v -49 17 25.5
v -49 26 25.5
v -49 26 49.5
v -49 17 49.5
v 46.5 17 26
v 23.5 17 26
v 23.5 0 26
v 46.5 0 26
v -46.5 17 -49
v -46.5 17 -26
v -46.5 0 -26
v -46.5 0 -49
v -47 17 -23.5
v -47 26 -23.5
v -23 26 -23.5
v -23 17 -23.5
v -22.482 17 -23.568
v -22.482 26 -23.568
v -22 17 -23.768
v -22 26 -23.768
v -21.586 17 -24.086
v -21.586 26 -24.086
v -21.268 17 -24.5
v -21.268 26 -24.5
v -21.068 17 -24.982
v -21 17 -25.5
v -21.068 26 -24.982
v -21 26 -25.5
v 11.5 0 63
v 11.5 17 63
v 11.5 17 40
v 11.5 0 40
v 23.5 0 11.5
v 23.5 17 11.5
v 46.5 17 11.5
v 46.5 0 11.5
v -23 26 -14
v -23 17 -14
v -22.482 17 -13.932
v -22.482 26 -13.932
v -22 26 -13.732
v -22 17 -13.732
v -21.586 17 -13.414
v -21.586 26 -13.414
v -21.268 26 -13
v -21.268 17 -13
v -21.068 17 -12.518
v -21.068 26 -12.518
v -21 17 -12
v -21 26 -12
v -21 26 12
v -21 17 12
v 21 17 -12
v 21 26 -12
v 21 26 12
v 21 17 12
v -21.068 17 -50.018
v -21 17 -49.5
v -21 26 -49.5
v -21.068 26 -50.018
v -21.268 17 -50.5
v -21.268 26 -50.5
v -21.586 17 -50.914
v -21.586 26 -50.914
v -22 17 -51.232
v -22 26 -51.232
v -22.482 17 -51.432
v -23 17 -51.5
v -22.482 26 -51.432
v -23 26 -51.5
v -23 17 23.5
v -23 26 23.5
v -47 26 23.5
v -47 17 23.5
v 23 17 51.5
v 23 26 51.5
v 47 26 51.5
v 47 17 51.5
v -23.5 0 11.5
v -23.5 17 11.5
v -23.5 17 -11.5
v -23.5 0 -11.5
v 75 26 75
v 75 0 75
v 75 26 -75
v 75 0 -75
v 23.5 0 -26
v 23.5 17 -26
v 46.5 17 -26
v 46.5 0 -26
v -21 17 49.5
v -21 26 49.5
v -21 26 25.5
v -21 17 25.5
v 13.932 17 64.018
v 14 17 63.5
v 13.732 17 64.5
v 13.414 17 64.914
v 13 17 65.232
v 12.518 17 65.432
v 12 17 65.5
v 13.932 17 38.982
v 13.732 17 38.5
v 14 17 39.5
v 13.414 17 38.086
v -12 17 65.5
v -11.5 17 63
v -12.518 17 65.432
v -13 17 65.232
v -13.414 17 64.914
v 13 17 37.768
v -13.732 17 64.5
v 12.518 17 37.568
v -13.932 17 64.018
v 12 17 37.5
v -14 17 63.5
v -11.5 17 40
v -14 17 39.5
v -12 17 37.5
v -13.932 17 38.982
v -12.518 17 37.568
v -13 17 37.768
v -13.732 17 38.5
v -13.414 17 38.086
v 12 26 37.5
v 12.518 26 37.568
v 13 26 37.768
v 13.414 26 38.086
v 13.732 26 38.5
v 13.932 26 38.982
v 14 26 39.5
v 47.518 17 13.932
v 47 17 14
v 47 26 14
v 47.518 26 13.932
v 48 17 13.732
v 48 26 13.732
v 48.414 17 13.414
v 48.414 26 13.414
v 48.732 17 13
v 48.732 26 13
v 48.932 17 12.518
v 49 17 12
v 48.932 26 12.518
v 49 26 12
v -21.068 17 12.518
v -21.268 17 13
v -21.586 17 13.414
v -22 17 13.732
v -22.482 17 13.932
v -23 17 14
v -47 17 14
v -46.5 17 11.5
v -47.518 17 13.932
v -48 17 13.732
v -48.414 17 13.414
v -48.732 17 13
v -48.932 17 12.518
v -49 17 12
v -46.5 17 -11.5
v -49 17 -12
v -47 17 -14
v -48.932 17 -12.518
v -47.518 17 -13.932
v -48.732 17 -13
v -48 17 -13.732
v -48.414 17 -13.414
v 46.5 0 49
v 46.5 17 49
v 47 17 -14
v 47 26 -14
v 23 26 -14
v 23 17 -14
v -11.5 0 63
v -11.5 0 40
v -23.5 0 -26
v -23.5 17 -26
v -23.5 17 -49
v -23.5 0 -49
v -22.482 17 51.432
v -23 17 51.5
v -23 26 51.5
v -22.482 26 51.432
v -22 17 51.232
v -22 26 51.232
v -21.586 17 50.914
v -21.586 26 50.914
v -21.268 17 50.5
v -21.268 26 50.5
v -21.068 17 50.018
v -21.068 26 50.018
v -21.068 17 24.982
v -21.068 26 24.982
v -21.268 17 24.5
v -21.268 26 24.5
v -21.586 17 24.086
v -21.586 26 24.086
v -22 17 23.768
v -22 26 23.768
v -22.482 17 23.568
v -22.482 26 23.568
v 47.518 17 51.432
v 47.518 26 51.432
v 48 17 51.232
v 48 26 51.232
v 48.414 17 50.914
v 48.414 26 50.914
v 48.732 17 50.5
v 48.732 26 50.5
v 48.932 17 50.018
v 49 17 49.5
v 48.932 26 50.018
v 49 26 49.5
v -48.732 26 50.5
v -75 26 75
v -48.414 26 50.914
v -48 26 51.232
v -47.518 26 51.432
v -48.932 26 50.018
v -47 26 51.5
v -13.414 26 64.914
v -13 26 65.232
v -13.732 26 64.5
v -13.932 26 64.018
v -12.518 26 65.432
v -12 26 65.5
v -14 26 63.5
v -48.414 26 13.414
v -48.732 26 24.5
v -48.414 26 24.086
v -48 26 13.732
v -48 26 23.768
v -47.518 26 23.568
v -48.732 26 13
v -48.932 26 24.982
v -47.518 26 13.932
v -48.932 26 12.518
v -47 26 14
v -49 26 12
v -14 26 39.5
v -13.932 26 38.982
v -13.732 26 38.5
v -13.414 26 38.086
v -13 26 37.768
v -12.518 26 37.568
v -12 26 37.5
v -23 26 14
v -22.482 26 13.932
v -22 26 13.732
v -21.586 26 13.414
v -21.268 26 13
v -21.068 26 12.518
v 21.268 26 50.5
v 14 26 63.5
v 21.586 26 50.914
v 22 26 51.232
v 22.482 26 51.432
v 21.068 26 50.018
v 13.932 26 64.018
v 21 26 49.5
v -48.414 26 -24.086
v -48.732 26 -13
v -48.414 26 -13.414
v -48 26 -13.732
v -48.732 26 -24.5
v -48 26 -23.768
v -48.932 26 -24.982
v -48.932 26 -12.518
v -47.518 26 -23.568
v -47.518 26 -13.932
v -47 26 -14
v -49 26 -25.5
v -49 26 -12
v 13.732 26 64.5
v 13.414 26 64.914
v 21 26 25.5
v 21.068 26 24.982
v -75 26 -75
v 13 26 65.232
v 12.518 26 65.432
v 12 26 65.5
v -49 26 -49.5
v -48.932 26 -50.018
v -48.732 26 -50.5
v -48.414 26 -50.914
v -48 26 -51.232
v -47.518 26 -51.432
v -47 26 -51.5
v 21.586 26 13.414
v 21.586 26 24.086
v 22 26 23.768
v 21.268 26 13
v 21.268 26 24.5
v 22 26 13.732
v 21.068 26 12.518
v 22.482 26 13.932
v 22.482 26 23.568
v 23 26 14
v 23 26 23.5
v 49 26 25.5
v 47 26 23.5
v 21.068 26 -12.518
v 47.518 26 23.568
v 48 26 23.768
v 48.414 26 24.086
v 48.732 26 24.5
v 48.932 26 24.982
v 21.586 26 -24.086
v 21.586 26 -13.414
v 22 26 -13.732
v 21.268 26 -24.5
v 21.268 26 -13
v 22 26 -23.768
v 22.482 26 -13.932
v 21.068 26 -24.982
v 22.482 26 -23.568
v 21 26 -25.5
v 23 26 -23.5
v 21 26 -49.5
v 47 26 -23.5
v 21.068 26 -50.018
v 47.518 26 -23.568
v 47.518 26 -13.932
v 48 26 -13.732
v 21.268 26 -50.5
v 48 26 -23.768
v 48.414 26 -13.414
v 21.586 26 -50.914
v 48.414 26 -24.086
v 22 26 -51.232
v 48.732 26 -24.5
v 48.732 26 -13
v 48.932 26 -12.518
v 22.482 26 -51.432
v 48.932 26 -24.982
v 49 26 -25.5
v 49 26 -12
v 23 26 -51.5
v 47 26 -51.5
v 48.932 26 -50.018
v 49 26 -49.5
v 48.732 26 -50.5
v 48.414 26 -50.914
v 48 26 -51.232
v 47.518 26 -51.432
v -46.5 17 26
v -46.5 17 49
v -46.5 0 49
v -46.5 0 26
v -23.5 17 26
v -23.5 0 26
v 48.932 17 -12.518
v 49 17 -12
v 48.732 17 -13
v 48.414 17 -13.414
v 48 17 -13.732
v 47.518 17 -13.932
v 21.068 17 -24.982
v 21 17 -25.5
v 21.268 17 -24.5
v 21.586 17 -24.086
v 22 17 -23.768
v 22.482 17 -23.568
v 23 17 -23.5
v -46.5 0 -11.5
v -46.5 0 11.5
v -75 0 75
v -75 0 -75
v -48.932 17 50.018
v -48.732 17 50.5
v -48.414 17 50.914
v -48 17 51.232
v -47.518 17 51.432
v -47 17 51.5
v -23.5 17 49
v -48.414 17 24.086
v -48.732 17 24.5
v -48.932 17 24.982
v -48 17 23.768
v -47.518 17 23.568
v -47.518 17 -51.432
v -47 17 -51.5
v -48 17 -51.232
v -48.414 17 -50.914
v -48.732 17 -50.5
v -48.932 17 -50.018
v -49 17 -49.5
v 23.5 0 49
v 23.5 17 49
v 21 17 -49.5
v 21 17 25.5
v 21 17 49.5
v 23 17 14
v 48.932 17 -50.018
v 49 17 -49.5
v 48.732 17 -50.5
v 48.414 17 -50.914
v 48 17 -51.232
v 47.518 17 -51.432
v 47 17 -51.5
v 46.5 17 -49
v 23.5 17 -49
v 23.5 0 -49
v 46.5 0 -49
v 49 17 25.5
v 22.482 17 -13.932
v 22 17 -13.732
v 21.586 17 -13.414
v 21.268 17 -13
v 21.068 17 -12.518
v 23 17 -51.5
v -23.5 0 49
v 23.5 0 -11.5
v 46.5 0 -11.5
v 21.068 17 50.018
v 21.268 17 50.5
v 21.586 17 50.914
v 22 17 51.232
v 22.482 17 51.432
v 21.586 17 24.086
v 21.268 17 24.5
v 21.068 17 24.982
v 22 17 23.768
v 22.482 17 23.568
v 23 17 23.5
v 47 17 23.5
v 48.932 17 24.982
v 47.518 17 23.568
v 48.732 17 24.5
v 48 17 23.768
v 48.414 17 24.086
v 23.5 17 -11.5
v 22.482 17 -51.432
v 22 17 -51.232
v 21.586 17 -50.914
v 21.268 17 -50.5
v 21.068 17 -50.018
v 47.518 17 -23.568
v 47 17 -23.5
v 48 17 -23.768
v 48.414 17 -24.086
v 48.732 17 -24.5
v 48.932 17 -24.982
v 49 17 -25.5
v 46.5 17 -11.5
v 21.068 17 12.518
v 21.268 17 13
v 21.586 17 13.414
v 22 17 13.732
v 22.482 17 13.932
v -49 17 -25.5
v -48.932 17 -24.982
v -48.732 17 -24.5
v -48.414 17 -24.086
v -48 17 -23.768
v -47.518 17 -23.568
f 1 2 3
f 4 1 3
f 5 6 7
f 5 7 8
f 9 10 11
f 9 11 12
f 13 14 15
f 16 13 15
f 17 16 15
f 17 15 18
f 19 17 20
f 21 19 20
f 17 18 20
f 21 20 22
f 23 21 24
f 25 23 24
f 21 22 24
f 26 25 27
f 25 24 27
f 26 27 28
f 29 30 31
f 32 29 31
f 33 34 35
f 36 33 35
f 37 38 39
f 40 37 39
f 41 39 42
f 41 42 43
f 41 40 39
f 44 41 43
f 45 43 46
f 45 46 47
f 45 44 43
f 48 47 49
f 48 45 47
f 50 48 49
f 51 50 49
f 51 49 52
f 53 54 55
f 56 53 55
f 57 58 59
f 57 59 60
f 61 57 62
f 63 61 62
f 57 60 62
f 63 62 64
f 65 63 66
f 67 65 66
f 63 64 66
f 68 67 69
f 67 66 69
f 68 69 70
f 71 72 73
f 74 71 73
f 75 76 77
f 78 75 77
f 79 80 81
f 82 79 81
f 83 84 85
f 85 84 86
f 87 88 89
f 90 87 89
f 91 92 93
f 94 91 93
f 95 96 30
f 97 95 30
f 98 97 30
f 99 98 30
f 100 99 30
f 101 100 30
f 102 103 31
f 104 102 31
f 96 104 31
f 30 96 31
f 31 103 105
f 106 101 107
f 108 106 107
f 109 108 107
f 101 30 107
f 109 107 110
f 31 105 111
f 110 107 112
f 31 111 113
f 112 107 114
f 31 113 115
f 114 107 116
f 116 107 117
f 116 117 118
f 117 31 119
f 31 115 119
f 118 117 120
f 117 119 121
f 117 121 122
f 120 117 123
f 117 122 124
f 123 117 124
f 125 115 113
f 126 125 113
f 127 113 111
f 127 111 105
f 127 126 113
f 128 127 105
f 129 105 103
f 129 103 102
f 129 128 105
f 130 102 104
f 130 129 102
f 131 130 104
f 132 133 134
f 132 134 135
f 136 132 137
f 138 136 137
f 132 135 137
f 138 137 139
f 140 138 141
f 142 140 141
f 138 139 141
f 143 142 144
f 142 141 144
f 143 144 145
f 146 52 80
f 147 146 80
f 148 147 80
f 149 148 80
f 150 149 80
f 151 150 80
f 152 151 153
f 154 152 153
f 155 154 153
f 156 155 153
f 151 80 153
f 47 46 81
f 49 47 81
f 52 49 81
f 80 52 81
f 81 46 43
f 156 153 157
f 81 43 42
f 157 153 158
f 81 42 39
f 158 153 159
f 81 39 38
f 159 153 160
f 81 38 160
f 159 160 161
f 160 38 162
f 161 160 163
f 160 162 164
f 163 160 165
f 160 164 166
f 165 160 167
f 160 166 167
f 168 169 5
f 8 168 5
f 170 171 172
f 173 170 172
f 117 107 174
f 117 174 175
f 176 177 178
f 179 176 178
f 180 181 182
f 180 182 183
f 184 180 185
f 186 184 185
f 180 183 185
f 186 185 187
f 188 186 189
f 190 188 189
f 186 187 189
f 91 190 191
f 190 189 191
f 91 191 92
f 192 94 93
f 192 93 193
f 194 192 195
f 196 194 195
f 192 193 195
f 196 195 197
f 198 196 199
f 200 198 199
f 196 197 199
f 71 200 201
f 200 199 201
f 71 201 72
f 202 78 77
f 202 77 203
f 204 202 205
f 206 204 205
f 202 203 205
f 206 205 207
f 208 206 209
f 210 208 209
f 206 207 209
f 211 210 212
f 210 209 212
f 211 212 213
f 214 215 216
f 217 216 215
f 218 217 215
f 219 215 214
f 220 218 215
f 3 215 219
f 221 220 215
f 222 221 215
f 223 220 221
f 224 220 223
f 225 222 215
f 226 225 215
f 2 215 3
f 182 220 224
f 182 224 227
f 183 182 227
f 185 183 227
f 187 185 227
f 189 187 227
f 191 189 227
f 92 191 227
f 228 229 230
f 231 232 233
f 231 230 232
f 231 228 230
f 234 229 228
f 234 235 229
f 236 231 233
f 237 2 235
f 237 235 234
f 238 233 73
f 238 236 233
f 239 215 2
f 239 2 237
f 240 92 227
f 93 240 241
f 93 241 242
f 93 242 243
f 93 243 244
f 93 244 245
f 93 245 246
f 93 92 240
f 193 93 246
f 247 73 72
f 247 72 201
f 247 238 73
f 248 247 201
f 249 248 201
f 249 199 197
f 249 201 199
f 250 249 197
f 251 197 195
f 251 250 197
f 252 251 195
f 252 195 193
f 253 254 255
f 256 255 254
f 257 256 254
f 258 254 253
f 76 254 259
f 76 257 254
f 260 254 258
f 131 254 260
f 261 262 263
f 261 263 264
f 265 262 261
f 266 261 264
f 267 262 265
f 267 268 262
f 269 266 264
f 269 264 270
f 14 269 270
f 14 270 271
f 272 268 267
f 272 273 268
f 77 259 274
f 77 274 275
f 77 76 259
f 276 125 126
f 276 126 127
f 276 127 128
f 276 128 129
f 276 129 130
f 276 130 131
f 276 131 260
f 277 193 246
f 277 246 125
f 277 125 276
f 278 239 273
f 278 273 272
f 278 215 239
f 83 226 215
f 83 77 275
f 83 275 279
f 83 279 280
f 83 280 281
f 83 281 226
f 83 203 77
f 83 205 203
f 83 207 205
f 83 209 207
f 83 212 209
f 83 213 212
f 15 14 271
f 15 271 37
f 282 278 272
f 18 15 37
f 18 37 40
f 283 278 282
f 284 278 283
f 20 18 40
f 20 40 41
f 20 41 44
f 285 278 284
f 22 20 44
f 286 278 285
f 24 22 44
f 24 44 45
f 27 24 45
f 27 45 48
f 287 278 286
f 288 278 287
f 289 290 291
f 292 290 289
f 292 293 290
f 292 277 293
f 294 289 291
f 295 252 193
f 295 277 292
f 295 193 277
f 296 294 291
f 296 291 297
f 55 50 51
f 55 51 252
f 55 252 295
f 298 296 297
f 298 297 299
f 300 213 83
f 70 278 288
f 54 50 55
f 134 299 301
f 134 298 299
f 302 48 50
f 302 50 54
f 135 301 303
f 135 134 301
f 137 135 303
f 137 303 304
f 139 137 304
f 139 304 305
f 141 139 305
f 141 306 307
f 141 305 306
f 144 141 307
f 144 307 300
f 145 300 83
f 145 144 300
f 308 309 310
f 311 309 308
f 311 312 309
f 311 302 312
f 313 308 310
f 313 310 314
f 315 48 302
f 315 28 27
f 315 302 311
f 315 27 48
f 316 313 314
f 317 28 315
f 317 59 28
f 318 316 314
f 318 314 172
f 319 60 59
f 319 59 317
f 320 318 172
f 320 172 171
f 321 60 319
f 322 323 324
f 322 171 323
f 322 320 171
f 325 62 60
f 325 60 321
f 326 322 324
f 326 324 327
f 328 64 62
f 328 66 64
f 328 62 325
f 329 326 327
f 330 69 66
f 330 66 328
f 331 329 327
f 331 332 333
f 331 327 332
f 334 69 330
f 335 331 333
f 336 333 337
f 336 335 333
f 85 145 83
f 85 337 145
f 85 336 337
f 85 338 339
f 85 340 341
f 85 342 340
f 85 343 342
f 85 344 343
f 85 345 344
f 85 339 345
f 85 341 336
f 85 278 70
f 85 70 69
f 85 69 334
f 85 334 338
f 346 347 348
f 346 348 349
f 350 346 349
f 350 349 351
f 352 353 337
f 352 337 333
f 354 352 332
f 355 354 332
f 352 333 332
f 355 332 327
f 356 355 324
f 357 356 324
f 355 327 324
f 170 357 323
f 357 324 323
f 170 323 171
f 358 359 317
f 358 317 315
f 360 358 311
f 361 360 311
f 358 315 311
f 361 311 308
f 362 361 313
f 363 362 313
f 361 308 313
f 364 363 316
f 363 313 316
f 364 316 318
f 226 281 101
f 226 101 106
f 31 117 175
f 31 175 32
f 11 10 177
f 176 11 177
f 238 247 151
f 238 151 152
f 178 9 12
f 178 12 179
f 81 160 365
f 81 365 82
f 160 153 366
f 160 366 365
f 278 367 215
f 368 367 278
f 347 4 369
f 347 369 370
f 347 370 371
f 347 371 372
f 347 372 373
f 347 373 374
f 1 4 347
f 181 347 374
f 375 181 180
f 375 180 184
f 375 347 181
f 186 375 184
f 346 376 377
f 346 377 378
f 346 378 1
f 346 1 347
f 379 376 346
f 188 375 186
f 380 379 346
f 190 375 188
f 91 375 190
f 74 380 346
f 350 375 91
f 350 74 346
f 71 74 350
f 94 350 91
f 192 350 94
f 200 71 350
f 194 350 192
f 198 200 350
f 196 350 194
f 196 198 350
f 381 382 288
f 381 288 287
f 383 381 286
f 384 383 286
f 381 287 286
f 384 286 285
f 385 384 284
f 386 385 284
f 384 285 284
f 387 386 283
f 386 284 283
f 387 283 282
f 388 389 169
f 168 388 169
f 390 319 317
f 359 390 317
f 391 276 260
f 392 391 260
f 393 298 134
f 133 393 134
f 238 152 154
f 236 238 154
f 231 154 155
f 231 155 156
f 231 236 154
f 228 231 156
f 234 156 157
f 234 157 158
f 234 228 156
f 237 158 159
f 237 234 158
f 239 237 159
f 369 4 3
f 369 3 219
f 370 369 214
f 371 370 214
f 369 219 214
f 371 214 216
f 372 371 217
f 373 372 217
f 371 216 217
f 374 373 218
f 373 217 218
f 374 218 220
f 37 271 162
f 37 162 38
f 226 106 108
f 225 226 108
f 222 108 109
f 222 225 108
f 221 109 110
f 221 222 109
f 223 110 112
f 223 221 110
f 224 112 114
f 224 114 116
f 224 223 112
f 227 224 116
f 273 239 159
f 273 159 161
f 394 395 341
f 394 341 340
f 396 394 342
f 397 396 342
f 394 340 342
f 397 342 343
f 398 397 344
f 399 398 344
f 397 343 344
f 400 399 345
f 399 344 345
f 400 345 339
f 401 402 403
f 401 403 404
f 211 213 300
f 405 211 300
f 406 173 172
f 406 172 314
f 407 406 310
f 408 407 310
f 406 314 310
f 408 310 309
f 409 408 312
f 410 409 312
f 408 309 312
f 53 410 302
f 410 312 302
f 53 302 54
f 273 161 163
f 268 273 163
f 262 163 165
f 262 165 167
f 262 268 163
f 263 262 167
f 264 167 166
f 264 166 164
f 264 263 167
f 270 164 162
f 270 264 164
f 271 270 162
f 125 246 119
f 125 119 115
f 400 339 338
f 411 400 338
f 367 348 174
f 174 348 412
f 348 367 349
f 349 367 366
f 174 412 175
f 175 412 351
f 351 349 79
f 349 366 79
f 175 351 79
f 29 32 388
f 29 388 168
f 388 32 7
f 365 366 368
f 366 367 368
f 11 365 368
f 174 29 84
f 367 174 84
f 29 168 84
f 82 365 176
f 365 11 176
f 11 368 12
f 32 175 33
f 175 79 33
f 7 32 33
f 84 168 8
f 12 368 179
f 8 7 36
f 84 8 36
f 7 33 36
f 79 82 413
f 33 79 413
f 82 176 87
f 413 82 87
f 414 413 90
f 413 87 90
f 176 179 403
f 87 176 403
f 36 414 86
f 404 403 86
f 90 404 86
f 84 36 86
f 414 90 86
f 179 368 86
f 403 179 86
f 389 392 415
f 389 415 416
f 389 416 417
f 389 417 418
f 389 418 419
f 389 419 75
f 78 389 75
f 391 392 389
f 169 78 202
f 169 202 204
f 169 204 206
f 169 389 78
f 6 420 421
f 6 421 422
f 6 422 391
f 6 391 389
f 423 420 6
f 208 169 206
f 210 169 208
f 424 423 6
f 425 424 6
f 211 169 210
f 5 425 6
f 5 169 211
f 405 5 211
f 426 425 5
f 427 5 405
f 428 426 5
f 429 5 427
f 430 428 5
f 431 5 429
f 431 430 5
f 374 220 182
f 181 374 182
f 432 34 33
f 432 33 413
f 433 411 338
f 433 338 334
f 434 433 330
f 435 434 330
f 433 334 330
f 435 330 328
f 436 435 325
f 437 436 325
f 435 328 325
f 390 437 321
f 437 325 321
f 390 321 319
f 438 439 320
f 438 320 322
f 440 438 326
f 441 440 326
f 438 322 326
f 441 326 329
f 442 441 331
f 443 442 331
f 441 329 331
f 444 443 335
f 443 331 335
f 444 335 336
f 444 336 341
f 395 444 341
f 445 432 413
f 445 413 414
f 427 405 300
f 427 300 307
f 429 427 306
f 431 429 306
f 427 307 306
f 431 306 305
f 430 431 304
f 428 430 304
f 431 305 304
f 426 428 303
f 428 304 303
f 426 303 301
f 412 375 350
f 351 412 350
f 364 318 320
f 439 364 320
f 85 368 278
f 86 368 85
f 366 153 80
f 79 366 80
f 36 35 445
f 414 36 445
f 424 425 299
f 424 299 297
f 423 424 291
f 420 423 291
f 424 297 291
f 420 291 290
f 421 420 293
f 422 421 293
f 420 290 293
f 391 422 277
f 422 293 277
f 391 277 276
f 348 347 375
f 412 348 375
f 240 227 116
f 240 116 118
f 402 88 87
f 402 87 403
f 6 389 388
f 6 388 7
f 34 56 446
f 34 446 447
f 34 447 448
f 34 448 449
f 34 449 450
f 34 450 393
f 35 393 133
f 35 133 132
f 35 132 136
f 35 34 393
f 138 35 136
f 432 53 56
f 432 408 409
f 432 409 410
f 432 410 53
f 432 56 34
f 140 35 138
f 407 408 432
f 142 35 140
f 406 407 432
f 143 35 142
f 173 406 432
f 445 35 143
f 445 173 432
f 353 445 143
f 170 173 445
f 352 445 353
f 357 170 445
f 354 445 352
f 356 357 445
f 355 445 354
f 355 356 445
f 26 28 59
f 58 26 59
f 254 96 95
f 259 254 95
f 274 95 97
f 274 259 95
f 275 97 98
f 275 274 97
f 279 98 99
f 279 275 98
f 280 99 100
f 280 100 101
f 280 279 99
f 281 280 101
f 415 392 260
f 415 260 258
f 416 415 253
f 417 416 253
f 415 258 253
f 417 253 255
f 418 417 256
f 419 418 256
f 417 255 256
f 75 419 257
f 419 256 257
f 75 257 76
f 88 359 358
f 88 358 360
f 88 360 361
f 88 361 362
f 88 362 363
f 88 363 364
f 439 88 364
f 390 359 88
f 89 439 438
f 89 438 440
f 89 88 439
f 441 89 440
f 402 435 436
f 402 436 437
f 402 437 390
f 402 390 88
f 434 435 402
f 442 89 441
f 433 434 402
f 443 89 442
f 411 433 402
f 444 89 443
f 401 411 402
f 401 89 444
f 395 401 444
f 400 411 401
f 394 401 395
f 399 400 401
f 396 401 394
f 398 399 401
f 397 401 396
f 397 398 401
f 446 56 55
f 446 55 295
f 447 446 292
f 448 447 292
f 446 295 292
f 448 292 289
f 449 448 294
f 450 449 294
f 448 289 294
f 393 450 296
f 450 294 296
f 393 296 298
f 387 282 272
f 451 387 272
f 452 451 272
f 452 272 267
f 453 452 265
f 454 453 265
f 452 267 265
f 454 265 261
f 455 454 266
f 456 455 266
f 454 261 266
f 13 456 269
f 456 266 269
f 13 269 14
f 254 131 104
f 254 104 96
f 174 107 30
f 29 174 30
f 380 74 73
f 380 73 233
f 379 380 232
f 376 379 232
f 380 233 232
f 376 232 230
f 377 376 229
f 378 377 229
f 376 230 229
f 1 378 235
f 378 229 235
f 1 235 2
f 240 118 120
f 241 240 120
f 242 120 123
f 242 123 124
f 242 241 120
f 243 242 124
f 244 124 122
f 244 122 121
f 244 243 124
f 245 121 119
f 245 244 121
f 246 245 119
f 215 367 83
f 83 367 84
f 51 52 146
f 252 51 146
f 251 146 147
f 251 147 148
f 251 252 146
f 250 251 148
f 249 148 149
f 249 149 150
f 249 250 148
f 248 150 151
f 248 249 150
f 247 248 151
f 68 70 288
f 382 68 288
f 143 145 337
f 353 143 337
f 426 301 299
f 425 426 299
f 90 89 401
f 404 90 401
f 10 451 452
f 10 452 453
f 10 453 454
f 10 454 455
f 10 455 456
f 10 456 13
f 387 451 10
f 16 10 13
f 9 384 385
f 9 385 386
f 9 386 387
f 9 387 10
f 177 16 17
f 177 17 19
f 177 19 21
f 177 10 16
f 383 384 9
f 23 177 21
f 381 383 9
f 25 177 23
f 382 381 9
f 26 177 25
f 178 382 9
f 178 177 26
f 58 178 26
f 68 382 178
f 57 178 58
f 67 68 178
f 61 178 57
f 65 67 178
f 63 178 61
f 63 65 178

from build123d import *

# Parameters (mm, degrees)
SKETCH1_W           = 150
SKETCH1_H           = 150
BOSS_EXTRUDE1_DEPTH = 26
CUT_EXTRUDE1_DEPTH  = 9
SKETCH3_W           = 23
SKETCH3_H           = 23
CUT_EXTRUDE2_DEPTH  = 18


with BuildPart() as part:
    # Sketch1 → Boss-Extrude1 (new body)
    with BuildSketch(Plane(origin=(0, 0, 0), x_dir=(1, 0, 0), z_dir=(0, 1, 0))):
        Rectangle(SKETCH1_W, SKETCH1_H)
    extrude(amount=BOSS_EXTRUDE1_DEPTH)

    # Sketch2 → Cut-Extrude1 (cut)
    with BuildSketch(Plane(origin=(0, 26, 0), x_dir=(1, 0, 0), z_dir=(0, 1, 0))):
        with BuildLine():
            Line((-47, 23.5), (-23, 23.5))
            ThreePointArc((-23, 23.5), (-21.585786438, 24.085786438), (-21, 25.5))
            Line((-21, 25.5), (-21, 49.5))
            ThreePointArc((-21, 49.5), (-21.585786438, 50.914213562), (-23, 51.5))
            Line((-23, 51.5), (-47, 51.5))
            ThreePointArc((-47, 51.5), (-48.414213562, 50.914213562), (-49, 49.5))
            Line((-49, 49.5), (-49, 25.5))
            ThreePointArc((-49, 25.5), (-48.414213562, 24.085786438), (-47, 23.5))
        make_face()
        with BuildLine():
            Line((-47, 14), (-23, 14))
            ThreePointArc((-23, 14), (-21.585786438, 13.414213562), (-21, 12))
            Line((-21, 12), (-21, -12))
            ThreePointArc((-21, -12), (-21.585786438, -13.414213562), (-23, -14))
            Line((-23, -14), (-47, -14))
            ThreePointArc((-47, -14), (-48.414213562, -13.414213562), (-49, -12))
            Line((-49, -12), (-49, 12))
            ThreePointArc((-49, 12), (-48.414213562, 13.414213562), (-47, 14))
        make_face()
        with BuildLine():
            Line((-21, -49.5), (-21, -25.5))
            ThreePointArc((-21, -25.5), (-21.585786438, -24.085786438), (-23, -23.5))
            Line((-23, -23.5), (-47, -23.5))
            ThreePointArc((-47, -23.5), (-48.414213562, -24.085786438), (-49, -25.5))
            Line((-49, -25.5), (-49, -49.5))
            ThreePointArc((-49, -49.5), (-48.414213562, -50.914213562), (-47, -51.5))
            Line((-47, -51.5), (-23, -51.5))
            ThreePointArc((-23, -51.5), (-21.585786438, -50.914213562), (-21, -49.5))
        make_face()
        with BuildLine():
            Line((47, -23.5), (23, -23.5))
            ThreePointArc((23, -23.5), (21.585786438, -24.085786438), (21, -25.5))
            Line((21, -25.5), (21, -49.5))
            ThreePointArc((21, -49.5), (21.585786438, -50.914213562), (23, -51.5))
            Line((23, -51.5), (47, -51.5))
            ThreePointArc((47, -51.5), (48.414213562, -50.914213562), (49, -49.5))
            Line((49, -49.5), (49, -25.5))
            ThreePointArc((49, -25.5), (48.414213562, -24.085786438), (47, -23.5))
        make_face()
        with BuildLine():
            Line((21, 49.5), (21, 25.5))
            ThreePointArc((21, 25.5), (21.585786438, 24.085786438), (23, 23.5))
            Line((23, 23.5), (47, 23.5))
            ThreePointArc((47, 23.5), (48.414213562, 24.085786438), (49, 25.5))
            Line((49, 25.5), (49, 49.5))
            ThreePointArc((49, 49.5), (48.414213562, 50.914213562), (47, 51.5))
            Line((47, 51.5), (23, 51.5))
            ThreePointArc((23, 51.5), (21.585786438, 50.914213562), (21, 49.5))
        make_face()
        with BuildLine():
            Line((21, 12), (21, -12))
            ThreePointArc((21, -12), (21.585786438, -13.414213562), (23, -14))
            Line((23, -14), (47, -14))
            ThreePointArc((47, -14), (48.414213562, -13.414213562), (49, -12))
            Line((49, -12), (49, 12))
            ThreePointArc((49, 12), (48.414213562, 13.414213562), (47, 14))
            Line((47, 14), (23, 14))
            ThreePointArc((23, 14), (21.585786438, 13.414213562), (21, 12))
        make_face()
        with BuildLine():
            Line((-12, -37.5), (12, -37.5))
            ThreePointArc((12, -37.5), (13.414213562, -38.085786438), (14, -39.5))
            Line((14, -39.5), (14, -63.5))
            ThreePointArc((14, -63.5), (13.414213562, -64.914213562), (12, -65.5))
            Line((12, -65.5), (-12, -65.5))
            ThreePointArc((-12, -65.5), (-13.414213562, -64.914213562), (-14, -63.5))
            Line((-14, -63.5), (-14, -39.5))
            ThreePointArc((-14, -39.5), (-13.414213562, -38.085786438), (-12, -37.5))
        make_face()
    extrude(amount=-CUT_EXTRUDE1_DEPTH, mode=Mode.SUBTRACT)

    # Sketch3 → Cut-Extrude2 (cut, through all)
    with BuildSketch(Plane(origin=(0, 17, 0), x_dir=(1, 0, 0), z_dir=(0, 1, 0))):
        with Locations((-35, -37.5)):
            Rectangle(SKETCH3_W, SKETCH3_H)
        with Locations((-35, 37.5)):
            Rectangle(SKETCH3_W, SKETCH3_H)
        with Locations((35, -37.5)):
            Rectangle(SKETCH3_W, SKETCH3_H)
        with Locations((35, 37.5)):
            Rectangle(SKETCH3_W, SKETCH3_H)
        with Locations((-35, 0)):
            Rectangle(SKETCH3_W, SKETCH3_H)
        with Locations((35, 0)):
            Rectangle(SKETCH3_W, SKETCH3_H)
        with Locations((0, -51.5)):
            Rectangle(SKETCH3_W, SKETCH3_H)
    extrude(amount=-CUT_EXTRUDE2_DEPTH, mode=Mode.SUBTRACT)


solid = part.part
